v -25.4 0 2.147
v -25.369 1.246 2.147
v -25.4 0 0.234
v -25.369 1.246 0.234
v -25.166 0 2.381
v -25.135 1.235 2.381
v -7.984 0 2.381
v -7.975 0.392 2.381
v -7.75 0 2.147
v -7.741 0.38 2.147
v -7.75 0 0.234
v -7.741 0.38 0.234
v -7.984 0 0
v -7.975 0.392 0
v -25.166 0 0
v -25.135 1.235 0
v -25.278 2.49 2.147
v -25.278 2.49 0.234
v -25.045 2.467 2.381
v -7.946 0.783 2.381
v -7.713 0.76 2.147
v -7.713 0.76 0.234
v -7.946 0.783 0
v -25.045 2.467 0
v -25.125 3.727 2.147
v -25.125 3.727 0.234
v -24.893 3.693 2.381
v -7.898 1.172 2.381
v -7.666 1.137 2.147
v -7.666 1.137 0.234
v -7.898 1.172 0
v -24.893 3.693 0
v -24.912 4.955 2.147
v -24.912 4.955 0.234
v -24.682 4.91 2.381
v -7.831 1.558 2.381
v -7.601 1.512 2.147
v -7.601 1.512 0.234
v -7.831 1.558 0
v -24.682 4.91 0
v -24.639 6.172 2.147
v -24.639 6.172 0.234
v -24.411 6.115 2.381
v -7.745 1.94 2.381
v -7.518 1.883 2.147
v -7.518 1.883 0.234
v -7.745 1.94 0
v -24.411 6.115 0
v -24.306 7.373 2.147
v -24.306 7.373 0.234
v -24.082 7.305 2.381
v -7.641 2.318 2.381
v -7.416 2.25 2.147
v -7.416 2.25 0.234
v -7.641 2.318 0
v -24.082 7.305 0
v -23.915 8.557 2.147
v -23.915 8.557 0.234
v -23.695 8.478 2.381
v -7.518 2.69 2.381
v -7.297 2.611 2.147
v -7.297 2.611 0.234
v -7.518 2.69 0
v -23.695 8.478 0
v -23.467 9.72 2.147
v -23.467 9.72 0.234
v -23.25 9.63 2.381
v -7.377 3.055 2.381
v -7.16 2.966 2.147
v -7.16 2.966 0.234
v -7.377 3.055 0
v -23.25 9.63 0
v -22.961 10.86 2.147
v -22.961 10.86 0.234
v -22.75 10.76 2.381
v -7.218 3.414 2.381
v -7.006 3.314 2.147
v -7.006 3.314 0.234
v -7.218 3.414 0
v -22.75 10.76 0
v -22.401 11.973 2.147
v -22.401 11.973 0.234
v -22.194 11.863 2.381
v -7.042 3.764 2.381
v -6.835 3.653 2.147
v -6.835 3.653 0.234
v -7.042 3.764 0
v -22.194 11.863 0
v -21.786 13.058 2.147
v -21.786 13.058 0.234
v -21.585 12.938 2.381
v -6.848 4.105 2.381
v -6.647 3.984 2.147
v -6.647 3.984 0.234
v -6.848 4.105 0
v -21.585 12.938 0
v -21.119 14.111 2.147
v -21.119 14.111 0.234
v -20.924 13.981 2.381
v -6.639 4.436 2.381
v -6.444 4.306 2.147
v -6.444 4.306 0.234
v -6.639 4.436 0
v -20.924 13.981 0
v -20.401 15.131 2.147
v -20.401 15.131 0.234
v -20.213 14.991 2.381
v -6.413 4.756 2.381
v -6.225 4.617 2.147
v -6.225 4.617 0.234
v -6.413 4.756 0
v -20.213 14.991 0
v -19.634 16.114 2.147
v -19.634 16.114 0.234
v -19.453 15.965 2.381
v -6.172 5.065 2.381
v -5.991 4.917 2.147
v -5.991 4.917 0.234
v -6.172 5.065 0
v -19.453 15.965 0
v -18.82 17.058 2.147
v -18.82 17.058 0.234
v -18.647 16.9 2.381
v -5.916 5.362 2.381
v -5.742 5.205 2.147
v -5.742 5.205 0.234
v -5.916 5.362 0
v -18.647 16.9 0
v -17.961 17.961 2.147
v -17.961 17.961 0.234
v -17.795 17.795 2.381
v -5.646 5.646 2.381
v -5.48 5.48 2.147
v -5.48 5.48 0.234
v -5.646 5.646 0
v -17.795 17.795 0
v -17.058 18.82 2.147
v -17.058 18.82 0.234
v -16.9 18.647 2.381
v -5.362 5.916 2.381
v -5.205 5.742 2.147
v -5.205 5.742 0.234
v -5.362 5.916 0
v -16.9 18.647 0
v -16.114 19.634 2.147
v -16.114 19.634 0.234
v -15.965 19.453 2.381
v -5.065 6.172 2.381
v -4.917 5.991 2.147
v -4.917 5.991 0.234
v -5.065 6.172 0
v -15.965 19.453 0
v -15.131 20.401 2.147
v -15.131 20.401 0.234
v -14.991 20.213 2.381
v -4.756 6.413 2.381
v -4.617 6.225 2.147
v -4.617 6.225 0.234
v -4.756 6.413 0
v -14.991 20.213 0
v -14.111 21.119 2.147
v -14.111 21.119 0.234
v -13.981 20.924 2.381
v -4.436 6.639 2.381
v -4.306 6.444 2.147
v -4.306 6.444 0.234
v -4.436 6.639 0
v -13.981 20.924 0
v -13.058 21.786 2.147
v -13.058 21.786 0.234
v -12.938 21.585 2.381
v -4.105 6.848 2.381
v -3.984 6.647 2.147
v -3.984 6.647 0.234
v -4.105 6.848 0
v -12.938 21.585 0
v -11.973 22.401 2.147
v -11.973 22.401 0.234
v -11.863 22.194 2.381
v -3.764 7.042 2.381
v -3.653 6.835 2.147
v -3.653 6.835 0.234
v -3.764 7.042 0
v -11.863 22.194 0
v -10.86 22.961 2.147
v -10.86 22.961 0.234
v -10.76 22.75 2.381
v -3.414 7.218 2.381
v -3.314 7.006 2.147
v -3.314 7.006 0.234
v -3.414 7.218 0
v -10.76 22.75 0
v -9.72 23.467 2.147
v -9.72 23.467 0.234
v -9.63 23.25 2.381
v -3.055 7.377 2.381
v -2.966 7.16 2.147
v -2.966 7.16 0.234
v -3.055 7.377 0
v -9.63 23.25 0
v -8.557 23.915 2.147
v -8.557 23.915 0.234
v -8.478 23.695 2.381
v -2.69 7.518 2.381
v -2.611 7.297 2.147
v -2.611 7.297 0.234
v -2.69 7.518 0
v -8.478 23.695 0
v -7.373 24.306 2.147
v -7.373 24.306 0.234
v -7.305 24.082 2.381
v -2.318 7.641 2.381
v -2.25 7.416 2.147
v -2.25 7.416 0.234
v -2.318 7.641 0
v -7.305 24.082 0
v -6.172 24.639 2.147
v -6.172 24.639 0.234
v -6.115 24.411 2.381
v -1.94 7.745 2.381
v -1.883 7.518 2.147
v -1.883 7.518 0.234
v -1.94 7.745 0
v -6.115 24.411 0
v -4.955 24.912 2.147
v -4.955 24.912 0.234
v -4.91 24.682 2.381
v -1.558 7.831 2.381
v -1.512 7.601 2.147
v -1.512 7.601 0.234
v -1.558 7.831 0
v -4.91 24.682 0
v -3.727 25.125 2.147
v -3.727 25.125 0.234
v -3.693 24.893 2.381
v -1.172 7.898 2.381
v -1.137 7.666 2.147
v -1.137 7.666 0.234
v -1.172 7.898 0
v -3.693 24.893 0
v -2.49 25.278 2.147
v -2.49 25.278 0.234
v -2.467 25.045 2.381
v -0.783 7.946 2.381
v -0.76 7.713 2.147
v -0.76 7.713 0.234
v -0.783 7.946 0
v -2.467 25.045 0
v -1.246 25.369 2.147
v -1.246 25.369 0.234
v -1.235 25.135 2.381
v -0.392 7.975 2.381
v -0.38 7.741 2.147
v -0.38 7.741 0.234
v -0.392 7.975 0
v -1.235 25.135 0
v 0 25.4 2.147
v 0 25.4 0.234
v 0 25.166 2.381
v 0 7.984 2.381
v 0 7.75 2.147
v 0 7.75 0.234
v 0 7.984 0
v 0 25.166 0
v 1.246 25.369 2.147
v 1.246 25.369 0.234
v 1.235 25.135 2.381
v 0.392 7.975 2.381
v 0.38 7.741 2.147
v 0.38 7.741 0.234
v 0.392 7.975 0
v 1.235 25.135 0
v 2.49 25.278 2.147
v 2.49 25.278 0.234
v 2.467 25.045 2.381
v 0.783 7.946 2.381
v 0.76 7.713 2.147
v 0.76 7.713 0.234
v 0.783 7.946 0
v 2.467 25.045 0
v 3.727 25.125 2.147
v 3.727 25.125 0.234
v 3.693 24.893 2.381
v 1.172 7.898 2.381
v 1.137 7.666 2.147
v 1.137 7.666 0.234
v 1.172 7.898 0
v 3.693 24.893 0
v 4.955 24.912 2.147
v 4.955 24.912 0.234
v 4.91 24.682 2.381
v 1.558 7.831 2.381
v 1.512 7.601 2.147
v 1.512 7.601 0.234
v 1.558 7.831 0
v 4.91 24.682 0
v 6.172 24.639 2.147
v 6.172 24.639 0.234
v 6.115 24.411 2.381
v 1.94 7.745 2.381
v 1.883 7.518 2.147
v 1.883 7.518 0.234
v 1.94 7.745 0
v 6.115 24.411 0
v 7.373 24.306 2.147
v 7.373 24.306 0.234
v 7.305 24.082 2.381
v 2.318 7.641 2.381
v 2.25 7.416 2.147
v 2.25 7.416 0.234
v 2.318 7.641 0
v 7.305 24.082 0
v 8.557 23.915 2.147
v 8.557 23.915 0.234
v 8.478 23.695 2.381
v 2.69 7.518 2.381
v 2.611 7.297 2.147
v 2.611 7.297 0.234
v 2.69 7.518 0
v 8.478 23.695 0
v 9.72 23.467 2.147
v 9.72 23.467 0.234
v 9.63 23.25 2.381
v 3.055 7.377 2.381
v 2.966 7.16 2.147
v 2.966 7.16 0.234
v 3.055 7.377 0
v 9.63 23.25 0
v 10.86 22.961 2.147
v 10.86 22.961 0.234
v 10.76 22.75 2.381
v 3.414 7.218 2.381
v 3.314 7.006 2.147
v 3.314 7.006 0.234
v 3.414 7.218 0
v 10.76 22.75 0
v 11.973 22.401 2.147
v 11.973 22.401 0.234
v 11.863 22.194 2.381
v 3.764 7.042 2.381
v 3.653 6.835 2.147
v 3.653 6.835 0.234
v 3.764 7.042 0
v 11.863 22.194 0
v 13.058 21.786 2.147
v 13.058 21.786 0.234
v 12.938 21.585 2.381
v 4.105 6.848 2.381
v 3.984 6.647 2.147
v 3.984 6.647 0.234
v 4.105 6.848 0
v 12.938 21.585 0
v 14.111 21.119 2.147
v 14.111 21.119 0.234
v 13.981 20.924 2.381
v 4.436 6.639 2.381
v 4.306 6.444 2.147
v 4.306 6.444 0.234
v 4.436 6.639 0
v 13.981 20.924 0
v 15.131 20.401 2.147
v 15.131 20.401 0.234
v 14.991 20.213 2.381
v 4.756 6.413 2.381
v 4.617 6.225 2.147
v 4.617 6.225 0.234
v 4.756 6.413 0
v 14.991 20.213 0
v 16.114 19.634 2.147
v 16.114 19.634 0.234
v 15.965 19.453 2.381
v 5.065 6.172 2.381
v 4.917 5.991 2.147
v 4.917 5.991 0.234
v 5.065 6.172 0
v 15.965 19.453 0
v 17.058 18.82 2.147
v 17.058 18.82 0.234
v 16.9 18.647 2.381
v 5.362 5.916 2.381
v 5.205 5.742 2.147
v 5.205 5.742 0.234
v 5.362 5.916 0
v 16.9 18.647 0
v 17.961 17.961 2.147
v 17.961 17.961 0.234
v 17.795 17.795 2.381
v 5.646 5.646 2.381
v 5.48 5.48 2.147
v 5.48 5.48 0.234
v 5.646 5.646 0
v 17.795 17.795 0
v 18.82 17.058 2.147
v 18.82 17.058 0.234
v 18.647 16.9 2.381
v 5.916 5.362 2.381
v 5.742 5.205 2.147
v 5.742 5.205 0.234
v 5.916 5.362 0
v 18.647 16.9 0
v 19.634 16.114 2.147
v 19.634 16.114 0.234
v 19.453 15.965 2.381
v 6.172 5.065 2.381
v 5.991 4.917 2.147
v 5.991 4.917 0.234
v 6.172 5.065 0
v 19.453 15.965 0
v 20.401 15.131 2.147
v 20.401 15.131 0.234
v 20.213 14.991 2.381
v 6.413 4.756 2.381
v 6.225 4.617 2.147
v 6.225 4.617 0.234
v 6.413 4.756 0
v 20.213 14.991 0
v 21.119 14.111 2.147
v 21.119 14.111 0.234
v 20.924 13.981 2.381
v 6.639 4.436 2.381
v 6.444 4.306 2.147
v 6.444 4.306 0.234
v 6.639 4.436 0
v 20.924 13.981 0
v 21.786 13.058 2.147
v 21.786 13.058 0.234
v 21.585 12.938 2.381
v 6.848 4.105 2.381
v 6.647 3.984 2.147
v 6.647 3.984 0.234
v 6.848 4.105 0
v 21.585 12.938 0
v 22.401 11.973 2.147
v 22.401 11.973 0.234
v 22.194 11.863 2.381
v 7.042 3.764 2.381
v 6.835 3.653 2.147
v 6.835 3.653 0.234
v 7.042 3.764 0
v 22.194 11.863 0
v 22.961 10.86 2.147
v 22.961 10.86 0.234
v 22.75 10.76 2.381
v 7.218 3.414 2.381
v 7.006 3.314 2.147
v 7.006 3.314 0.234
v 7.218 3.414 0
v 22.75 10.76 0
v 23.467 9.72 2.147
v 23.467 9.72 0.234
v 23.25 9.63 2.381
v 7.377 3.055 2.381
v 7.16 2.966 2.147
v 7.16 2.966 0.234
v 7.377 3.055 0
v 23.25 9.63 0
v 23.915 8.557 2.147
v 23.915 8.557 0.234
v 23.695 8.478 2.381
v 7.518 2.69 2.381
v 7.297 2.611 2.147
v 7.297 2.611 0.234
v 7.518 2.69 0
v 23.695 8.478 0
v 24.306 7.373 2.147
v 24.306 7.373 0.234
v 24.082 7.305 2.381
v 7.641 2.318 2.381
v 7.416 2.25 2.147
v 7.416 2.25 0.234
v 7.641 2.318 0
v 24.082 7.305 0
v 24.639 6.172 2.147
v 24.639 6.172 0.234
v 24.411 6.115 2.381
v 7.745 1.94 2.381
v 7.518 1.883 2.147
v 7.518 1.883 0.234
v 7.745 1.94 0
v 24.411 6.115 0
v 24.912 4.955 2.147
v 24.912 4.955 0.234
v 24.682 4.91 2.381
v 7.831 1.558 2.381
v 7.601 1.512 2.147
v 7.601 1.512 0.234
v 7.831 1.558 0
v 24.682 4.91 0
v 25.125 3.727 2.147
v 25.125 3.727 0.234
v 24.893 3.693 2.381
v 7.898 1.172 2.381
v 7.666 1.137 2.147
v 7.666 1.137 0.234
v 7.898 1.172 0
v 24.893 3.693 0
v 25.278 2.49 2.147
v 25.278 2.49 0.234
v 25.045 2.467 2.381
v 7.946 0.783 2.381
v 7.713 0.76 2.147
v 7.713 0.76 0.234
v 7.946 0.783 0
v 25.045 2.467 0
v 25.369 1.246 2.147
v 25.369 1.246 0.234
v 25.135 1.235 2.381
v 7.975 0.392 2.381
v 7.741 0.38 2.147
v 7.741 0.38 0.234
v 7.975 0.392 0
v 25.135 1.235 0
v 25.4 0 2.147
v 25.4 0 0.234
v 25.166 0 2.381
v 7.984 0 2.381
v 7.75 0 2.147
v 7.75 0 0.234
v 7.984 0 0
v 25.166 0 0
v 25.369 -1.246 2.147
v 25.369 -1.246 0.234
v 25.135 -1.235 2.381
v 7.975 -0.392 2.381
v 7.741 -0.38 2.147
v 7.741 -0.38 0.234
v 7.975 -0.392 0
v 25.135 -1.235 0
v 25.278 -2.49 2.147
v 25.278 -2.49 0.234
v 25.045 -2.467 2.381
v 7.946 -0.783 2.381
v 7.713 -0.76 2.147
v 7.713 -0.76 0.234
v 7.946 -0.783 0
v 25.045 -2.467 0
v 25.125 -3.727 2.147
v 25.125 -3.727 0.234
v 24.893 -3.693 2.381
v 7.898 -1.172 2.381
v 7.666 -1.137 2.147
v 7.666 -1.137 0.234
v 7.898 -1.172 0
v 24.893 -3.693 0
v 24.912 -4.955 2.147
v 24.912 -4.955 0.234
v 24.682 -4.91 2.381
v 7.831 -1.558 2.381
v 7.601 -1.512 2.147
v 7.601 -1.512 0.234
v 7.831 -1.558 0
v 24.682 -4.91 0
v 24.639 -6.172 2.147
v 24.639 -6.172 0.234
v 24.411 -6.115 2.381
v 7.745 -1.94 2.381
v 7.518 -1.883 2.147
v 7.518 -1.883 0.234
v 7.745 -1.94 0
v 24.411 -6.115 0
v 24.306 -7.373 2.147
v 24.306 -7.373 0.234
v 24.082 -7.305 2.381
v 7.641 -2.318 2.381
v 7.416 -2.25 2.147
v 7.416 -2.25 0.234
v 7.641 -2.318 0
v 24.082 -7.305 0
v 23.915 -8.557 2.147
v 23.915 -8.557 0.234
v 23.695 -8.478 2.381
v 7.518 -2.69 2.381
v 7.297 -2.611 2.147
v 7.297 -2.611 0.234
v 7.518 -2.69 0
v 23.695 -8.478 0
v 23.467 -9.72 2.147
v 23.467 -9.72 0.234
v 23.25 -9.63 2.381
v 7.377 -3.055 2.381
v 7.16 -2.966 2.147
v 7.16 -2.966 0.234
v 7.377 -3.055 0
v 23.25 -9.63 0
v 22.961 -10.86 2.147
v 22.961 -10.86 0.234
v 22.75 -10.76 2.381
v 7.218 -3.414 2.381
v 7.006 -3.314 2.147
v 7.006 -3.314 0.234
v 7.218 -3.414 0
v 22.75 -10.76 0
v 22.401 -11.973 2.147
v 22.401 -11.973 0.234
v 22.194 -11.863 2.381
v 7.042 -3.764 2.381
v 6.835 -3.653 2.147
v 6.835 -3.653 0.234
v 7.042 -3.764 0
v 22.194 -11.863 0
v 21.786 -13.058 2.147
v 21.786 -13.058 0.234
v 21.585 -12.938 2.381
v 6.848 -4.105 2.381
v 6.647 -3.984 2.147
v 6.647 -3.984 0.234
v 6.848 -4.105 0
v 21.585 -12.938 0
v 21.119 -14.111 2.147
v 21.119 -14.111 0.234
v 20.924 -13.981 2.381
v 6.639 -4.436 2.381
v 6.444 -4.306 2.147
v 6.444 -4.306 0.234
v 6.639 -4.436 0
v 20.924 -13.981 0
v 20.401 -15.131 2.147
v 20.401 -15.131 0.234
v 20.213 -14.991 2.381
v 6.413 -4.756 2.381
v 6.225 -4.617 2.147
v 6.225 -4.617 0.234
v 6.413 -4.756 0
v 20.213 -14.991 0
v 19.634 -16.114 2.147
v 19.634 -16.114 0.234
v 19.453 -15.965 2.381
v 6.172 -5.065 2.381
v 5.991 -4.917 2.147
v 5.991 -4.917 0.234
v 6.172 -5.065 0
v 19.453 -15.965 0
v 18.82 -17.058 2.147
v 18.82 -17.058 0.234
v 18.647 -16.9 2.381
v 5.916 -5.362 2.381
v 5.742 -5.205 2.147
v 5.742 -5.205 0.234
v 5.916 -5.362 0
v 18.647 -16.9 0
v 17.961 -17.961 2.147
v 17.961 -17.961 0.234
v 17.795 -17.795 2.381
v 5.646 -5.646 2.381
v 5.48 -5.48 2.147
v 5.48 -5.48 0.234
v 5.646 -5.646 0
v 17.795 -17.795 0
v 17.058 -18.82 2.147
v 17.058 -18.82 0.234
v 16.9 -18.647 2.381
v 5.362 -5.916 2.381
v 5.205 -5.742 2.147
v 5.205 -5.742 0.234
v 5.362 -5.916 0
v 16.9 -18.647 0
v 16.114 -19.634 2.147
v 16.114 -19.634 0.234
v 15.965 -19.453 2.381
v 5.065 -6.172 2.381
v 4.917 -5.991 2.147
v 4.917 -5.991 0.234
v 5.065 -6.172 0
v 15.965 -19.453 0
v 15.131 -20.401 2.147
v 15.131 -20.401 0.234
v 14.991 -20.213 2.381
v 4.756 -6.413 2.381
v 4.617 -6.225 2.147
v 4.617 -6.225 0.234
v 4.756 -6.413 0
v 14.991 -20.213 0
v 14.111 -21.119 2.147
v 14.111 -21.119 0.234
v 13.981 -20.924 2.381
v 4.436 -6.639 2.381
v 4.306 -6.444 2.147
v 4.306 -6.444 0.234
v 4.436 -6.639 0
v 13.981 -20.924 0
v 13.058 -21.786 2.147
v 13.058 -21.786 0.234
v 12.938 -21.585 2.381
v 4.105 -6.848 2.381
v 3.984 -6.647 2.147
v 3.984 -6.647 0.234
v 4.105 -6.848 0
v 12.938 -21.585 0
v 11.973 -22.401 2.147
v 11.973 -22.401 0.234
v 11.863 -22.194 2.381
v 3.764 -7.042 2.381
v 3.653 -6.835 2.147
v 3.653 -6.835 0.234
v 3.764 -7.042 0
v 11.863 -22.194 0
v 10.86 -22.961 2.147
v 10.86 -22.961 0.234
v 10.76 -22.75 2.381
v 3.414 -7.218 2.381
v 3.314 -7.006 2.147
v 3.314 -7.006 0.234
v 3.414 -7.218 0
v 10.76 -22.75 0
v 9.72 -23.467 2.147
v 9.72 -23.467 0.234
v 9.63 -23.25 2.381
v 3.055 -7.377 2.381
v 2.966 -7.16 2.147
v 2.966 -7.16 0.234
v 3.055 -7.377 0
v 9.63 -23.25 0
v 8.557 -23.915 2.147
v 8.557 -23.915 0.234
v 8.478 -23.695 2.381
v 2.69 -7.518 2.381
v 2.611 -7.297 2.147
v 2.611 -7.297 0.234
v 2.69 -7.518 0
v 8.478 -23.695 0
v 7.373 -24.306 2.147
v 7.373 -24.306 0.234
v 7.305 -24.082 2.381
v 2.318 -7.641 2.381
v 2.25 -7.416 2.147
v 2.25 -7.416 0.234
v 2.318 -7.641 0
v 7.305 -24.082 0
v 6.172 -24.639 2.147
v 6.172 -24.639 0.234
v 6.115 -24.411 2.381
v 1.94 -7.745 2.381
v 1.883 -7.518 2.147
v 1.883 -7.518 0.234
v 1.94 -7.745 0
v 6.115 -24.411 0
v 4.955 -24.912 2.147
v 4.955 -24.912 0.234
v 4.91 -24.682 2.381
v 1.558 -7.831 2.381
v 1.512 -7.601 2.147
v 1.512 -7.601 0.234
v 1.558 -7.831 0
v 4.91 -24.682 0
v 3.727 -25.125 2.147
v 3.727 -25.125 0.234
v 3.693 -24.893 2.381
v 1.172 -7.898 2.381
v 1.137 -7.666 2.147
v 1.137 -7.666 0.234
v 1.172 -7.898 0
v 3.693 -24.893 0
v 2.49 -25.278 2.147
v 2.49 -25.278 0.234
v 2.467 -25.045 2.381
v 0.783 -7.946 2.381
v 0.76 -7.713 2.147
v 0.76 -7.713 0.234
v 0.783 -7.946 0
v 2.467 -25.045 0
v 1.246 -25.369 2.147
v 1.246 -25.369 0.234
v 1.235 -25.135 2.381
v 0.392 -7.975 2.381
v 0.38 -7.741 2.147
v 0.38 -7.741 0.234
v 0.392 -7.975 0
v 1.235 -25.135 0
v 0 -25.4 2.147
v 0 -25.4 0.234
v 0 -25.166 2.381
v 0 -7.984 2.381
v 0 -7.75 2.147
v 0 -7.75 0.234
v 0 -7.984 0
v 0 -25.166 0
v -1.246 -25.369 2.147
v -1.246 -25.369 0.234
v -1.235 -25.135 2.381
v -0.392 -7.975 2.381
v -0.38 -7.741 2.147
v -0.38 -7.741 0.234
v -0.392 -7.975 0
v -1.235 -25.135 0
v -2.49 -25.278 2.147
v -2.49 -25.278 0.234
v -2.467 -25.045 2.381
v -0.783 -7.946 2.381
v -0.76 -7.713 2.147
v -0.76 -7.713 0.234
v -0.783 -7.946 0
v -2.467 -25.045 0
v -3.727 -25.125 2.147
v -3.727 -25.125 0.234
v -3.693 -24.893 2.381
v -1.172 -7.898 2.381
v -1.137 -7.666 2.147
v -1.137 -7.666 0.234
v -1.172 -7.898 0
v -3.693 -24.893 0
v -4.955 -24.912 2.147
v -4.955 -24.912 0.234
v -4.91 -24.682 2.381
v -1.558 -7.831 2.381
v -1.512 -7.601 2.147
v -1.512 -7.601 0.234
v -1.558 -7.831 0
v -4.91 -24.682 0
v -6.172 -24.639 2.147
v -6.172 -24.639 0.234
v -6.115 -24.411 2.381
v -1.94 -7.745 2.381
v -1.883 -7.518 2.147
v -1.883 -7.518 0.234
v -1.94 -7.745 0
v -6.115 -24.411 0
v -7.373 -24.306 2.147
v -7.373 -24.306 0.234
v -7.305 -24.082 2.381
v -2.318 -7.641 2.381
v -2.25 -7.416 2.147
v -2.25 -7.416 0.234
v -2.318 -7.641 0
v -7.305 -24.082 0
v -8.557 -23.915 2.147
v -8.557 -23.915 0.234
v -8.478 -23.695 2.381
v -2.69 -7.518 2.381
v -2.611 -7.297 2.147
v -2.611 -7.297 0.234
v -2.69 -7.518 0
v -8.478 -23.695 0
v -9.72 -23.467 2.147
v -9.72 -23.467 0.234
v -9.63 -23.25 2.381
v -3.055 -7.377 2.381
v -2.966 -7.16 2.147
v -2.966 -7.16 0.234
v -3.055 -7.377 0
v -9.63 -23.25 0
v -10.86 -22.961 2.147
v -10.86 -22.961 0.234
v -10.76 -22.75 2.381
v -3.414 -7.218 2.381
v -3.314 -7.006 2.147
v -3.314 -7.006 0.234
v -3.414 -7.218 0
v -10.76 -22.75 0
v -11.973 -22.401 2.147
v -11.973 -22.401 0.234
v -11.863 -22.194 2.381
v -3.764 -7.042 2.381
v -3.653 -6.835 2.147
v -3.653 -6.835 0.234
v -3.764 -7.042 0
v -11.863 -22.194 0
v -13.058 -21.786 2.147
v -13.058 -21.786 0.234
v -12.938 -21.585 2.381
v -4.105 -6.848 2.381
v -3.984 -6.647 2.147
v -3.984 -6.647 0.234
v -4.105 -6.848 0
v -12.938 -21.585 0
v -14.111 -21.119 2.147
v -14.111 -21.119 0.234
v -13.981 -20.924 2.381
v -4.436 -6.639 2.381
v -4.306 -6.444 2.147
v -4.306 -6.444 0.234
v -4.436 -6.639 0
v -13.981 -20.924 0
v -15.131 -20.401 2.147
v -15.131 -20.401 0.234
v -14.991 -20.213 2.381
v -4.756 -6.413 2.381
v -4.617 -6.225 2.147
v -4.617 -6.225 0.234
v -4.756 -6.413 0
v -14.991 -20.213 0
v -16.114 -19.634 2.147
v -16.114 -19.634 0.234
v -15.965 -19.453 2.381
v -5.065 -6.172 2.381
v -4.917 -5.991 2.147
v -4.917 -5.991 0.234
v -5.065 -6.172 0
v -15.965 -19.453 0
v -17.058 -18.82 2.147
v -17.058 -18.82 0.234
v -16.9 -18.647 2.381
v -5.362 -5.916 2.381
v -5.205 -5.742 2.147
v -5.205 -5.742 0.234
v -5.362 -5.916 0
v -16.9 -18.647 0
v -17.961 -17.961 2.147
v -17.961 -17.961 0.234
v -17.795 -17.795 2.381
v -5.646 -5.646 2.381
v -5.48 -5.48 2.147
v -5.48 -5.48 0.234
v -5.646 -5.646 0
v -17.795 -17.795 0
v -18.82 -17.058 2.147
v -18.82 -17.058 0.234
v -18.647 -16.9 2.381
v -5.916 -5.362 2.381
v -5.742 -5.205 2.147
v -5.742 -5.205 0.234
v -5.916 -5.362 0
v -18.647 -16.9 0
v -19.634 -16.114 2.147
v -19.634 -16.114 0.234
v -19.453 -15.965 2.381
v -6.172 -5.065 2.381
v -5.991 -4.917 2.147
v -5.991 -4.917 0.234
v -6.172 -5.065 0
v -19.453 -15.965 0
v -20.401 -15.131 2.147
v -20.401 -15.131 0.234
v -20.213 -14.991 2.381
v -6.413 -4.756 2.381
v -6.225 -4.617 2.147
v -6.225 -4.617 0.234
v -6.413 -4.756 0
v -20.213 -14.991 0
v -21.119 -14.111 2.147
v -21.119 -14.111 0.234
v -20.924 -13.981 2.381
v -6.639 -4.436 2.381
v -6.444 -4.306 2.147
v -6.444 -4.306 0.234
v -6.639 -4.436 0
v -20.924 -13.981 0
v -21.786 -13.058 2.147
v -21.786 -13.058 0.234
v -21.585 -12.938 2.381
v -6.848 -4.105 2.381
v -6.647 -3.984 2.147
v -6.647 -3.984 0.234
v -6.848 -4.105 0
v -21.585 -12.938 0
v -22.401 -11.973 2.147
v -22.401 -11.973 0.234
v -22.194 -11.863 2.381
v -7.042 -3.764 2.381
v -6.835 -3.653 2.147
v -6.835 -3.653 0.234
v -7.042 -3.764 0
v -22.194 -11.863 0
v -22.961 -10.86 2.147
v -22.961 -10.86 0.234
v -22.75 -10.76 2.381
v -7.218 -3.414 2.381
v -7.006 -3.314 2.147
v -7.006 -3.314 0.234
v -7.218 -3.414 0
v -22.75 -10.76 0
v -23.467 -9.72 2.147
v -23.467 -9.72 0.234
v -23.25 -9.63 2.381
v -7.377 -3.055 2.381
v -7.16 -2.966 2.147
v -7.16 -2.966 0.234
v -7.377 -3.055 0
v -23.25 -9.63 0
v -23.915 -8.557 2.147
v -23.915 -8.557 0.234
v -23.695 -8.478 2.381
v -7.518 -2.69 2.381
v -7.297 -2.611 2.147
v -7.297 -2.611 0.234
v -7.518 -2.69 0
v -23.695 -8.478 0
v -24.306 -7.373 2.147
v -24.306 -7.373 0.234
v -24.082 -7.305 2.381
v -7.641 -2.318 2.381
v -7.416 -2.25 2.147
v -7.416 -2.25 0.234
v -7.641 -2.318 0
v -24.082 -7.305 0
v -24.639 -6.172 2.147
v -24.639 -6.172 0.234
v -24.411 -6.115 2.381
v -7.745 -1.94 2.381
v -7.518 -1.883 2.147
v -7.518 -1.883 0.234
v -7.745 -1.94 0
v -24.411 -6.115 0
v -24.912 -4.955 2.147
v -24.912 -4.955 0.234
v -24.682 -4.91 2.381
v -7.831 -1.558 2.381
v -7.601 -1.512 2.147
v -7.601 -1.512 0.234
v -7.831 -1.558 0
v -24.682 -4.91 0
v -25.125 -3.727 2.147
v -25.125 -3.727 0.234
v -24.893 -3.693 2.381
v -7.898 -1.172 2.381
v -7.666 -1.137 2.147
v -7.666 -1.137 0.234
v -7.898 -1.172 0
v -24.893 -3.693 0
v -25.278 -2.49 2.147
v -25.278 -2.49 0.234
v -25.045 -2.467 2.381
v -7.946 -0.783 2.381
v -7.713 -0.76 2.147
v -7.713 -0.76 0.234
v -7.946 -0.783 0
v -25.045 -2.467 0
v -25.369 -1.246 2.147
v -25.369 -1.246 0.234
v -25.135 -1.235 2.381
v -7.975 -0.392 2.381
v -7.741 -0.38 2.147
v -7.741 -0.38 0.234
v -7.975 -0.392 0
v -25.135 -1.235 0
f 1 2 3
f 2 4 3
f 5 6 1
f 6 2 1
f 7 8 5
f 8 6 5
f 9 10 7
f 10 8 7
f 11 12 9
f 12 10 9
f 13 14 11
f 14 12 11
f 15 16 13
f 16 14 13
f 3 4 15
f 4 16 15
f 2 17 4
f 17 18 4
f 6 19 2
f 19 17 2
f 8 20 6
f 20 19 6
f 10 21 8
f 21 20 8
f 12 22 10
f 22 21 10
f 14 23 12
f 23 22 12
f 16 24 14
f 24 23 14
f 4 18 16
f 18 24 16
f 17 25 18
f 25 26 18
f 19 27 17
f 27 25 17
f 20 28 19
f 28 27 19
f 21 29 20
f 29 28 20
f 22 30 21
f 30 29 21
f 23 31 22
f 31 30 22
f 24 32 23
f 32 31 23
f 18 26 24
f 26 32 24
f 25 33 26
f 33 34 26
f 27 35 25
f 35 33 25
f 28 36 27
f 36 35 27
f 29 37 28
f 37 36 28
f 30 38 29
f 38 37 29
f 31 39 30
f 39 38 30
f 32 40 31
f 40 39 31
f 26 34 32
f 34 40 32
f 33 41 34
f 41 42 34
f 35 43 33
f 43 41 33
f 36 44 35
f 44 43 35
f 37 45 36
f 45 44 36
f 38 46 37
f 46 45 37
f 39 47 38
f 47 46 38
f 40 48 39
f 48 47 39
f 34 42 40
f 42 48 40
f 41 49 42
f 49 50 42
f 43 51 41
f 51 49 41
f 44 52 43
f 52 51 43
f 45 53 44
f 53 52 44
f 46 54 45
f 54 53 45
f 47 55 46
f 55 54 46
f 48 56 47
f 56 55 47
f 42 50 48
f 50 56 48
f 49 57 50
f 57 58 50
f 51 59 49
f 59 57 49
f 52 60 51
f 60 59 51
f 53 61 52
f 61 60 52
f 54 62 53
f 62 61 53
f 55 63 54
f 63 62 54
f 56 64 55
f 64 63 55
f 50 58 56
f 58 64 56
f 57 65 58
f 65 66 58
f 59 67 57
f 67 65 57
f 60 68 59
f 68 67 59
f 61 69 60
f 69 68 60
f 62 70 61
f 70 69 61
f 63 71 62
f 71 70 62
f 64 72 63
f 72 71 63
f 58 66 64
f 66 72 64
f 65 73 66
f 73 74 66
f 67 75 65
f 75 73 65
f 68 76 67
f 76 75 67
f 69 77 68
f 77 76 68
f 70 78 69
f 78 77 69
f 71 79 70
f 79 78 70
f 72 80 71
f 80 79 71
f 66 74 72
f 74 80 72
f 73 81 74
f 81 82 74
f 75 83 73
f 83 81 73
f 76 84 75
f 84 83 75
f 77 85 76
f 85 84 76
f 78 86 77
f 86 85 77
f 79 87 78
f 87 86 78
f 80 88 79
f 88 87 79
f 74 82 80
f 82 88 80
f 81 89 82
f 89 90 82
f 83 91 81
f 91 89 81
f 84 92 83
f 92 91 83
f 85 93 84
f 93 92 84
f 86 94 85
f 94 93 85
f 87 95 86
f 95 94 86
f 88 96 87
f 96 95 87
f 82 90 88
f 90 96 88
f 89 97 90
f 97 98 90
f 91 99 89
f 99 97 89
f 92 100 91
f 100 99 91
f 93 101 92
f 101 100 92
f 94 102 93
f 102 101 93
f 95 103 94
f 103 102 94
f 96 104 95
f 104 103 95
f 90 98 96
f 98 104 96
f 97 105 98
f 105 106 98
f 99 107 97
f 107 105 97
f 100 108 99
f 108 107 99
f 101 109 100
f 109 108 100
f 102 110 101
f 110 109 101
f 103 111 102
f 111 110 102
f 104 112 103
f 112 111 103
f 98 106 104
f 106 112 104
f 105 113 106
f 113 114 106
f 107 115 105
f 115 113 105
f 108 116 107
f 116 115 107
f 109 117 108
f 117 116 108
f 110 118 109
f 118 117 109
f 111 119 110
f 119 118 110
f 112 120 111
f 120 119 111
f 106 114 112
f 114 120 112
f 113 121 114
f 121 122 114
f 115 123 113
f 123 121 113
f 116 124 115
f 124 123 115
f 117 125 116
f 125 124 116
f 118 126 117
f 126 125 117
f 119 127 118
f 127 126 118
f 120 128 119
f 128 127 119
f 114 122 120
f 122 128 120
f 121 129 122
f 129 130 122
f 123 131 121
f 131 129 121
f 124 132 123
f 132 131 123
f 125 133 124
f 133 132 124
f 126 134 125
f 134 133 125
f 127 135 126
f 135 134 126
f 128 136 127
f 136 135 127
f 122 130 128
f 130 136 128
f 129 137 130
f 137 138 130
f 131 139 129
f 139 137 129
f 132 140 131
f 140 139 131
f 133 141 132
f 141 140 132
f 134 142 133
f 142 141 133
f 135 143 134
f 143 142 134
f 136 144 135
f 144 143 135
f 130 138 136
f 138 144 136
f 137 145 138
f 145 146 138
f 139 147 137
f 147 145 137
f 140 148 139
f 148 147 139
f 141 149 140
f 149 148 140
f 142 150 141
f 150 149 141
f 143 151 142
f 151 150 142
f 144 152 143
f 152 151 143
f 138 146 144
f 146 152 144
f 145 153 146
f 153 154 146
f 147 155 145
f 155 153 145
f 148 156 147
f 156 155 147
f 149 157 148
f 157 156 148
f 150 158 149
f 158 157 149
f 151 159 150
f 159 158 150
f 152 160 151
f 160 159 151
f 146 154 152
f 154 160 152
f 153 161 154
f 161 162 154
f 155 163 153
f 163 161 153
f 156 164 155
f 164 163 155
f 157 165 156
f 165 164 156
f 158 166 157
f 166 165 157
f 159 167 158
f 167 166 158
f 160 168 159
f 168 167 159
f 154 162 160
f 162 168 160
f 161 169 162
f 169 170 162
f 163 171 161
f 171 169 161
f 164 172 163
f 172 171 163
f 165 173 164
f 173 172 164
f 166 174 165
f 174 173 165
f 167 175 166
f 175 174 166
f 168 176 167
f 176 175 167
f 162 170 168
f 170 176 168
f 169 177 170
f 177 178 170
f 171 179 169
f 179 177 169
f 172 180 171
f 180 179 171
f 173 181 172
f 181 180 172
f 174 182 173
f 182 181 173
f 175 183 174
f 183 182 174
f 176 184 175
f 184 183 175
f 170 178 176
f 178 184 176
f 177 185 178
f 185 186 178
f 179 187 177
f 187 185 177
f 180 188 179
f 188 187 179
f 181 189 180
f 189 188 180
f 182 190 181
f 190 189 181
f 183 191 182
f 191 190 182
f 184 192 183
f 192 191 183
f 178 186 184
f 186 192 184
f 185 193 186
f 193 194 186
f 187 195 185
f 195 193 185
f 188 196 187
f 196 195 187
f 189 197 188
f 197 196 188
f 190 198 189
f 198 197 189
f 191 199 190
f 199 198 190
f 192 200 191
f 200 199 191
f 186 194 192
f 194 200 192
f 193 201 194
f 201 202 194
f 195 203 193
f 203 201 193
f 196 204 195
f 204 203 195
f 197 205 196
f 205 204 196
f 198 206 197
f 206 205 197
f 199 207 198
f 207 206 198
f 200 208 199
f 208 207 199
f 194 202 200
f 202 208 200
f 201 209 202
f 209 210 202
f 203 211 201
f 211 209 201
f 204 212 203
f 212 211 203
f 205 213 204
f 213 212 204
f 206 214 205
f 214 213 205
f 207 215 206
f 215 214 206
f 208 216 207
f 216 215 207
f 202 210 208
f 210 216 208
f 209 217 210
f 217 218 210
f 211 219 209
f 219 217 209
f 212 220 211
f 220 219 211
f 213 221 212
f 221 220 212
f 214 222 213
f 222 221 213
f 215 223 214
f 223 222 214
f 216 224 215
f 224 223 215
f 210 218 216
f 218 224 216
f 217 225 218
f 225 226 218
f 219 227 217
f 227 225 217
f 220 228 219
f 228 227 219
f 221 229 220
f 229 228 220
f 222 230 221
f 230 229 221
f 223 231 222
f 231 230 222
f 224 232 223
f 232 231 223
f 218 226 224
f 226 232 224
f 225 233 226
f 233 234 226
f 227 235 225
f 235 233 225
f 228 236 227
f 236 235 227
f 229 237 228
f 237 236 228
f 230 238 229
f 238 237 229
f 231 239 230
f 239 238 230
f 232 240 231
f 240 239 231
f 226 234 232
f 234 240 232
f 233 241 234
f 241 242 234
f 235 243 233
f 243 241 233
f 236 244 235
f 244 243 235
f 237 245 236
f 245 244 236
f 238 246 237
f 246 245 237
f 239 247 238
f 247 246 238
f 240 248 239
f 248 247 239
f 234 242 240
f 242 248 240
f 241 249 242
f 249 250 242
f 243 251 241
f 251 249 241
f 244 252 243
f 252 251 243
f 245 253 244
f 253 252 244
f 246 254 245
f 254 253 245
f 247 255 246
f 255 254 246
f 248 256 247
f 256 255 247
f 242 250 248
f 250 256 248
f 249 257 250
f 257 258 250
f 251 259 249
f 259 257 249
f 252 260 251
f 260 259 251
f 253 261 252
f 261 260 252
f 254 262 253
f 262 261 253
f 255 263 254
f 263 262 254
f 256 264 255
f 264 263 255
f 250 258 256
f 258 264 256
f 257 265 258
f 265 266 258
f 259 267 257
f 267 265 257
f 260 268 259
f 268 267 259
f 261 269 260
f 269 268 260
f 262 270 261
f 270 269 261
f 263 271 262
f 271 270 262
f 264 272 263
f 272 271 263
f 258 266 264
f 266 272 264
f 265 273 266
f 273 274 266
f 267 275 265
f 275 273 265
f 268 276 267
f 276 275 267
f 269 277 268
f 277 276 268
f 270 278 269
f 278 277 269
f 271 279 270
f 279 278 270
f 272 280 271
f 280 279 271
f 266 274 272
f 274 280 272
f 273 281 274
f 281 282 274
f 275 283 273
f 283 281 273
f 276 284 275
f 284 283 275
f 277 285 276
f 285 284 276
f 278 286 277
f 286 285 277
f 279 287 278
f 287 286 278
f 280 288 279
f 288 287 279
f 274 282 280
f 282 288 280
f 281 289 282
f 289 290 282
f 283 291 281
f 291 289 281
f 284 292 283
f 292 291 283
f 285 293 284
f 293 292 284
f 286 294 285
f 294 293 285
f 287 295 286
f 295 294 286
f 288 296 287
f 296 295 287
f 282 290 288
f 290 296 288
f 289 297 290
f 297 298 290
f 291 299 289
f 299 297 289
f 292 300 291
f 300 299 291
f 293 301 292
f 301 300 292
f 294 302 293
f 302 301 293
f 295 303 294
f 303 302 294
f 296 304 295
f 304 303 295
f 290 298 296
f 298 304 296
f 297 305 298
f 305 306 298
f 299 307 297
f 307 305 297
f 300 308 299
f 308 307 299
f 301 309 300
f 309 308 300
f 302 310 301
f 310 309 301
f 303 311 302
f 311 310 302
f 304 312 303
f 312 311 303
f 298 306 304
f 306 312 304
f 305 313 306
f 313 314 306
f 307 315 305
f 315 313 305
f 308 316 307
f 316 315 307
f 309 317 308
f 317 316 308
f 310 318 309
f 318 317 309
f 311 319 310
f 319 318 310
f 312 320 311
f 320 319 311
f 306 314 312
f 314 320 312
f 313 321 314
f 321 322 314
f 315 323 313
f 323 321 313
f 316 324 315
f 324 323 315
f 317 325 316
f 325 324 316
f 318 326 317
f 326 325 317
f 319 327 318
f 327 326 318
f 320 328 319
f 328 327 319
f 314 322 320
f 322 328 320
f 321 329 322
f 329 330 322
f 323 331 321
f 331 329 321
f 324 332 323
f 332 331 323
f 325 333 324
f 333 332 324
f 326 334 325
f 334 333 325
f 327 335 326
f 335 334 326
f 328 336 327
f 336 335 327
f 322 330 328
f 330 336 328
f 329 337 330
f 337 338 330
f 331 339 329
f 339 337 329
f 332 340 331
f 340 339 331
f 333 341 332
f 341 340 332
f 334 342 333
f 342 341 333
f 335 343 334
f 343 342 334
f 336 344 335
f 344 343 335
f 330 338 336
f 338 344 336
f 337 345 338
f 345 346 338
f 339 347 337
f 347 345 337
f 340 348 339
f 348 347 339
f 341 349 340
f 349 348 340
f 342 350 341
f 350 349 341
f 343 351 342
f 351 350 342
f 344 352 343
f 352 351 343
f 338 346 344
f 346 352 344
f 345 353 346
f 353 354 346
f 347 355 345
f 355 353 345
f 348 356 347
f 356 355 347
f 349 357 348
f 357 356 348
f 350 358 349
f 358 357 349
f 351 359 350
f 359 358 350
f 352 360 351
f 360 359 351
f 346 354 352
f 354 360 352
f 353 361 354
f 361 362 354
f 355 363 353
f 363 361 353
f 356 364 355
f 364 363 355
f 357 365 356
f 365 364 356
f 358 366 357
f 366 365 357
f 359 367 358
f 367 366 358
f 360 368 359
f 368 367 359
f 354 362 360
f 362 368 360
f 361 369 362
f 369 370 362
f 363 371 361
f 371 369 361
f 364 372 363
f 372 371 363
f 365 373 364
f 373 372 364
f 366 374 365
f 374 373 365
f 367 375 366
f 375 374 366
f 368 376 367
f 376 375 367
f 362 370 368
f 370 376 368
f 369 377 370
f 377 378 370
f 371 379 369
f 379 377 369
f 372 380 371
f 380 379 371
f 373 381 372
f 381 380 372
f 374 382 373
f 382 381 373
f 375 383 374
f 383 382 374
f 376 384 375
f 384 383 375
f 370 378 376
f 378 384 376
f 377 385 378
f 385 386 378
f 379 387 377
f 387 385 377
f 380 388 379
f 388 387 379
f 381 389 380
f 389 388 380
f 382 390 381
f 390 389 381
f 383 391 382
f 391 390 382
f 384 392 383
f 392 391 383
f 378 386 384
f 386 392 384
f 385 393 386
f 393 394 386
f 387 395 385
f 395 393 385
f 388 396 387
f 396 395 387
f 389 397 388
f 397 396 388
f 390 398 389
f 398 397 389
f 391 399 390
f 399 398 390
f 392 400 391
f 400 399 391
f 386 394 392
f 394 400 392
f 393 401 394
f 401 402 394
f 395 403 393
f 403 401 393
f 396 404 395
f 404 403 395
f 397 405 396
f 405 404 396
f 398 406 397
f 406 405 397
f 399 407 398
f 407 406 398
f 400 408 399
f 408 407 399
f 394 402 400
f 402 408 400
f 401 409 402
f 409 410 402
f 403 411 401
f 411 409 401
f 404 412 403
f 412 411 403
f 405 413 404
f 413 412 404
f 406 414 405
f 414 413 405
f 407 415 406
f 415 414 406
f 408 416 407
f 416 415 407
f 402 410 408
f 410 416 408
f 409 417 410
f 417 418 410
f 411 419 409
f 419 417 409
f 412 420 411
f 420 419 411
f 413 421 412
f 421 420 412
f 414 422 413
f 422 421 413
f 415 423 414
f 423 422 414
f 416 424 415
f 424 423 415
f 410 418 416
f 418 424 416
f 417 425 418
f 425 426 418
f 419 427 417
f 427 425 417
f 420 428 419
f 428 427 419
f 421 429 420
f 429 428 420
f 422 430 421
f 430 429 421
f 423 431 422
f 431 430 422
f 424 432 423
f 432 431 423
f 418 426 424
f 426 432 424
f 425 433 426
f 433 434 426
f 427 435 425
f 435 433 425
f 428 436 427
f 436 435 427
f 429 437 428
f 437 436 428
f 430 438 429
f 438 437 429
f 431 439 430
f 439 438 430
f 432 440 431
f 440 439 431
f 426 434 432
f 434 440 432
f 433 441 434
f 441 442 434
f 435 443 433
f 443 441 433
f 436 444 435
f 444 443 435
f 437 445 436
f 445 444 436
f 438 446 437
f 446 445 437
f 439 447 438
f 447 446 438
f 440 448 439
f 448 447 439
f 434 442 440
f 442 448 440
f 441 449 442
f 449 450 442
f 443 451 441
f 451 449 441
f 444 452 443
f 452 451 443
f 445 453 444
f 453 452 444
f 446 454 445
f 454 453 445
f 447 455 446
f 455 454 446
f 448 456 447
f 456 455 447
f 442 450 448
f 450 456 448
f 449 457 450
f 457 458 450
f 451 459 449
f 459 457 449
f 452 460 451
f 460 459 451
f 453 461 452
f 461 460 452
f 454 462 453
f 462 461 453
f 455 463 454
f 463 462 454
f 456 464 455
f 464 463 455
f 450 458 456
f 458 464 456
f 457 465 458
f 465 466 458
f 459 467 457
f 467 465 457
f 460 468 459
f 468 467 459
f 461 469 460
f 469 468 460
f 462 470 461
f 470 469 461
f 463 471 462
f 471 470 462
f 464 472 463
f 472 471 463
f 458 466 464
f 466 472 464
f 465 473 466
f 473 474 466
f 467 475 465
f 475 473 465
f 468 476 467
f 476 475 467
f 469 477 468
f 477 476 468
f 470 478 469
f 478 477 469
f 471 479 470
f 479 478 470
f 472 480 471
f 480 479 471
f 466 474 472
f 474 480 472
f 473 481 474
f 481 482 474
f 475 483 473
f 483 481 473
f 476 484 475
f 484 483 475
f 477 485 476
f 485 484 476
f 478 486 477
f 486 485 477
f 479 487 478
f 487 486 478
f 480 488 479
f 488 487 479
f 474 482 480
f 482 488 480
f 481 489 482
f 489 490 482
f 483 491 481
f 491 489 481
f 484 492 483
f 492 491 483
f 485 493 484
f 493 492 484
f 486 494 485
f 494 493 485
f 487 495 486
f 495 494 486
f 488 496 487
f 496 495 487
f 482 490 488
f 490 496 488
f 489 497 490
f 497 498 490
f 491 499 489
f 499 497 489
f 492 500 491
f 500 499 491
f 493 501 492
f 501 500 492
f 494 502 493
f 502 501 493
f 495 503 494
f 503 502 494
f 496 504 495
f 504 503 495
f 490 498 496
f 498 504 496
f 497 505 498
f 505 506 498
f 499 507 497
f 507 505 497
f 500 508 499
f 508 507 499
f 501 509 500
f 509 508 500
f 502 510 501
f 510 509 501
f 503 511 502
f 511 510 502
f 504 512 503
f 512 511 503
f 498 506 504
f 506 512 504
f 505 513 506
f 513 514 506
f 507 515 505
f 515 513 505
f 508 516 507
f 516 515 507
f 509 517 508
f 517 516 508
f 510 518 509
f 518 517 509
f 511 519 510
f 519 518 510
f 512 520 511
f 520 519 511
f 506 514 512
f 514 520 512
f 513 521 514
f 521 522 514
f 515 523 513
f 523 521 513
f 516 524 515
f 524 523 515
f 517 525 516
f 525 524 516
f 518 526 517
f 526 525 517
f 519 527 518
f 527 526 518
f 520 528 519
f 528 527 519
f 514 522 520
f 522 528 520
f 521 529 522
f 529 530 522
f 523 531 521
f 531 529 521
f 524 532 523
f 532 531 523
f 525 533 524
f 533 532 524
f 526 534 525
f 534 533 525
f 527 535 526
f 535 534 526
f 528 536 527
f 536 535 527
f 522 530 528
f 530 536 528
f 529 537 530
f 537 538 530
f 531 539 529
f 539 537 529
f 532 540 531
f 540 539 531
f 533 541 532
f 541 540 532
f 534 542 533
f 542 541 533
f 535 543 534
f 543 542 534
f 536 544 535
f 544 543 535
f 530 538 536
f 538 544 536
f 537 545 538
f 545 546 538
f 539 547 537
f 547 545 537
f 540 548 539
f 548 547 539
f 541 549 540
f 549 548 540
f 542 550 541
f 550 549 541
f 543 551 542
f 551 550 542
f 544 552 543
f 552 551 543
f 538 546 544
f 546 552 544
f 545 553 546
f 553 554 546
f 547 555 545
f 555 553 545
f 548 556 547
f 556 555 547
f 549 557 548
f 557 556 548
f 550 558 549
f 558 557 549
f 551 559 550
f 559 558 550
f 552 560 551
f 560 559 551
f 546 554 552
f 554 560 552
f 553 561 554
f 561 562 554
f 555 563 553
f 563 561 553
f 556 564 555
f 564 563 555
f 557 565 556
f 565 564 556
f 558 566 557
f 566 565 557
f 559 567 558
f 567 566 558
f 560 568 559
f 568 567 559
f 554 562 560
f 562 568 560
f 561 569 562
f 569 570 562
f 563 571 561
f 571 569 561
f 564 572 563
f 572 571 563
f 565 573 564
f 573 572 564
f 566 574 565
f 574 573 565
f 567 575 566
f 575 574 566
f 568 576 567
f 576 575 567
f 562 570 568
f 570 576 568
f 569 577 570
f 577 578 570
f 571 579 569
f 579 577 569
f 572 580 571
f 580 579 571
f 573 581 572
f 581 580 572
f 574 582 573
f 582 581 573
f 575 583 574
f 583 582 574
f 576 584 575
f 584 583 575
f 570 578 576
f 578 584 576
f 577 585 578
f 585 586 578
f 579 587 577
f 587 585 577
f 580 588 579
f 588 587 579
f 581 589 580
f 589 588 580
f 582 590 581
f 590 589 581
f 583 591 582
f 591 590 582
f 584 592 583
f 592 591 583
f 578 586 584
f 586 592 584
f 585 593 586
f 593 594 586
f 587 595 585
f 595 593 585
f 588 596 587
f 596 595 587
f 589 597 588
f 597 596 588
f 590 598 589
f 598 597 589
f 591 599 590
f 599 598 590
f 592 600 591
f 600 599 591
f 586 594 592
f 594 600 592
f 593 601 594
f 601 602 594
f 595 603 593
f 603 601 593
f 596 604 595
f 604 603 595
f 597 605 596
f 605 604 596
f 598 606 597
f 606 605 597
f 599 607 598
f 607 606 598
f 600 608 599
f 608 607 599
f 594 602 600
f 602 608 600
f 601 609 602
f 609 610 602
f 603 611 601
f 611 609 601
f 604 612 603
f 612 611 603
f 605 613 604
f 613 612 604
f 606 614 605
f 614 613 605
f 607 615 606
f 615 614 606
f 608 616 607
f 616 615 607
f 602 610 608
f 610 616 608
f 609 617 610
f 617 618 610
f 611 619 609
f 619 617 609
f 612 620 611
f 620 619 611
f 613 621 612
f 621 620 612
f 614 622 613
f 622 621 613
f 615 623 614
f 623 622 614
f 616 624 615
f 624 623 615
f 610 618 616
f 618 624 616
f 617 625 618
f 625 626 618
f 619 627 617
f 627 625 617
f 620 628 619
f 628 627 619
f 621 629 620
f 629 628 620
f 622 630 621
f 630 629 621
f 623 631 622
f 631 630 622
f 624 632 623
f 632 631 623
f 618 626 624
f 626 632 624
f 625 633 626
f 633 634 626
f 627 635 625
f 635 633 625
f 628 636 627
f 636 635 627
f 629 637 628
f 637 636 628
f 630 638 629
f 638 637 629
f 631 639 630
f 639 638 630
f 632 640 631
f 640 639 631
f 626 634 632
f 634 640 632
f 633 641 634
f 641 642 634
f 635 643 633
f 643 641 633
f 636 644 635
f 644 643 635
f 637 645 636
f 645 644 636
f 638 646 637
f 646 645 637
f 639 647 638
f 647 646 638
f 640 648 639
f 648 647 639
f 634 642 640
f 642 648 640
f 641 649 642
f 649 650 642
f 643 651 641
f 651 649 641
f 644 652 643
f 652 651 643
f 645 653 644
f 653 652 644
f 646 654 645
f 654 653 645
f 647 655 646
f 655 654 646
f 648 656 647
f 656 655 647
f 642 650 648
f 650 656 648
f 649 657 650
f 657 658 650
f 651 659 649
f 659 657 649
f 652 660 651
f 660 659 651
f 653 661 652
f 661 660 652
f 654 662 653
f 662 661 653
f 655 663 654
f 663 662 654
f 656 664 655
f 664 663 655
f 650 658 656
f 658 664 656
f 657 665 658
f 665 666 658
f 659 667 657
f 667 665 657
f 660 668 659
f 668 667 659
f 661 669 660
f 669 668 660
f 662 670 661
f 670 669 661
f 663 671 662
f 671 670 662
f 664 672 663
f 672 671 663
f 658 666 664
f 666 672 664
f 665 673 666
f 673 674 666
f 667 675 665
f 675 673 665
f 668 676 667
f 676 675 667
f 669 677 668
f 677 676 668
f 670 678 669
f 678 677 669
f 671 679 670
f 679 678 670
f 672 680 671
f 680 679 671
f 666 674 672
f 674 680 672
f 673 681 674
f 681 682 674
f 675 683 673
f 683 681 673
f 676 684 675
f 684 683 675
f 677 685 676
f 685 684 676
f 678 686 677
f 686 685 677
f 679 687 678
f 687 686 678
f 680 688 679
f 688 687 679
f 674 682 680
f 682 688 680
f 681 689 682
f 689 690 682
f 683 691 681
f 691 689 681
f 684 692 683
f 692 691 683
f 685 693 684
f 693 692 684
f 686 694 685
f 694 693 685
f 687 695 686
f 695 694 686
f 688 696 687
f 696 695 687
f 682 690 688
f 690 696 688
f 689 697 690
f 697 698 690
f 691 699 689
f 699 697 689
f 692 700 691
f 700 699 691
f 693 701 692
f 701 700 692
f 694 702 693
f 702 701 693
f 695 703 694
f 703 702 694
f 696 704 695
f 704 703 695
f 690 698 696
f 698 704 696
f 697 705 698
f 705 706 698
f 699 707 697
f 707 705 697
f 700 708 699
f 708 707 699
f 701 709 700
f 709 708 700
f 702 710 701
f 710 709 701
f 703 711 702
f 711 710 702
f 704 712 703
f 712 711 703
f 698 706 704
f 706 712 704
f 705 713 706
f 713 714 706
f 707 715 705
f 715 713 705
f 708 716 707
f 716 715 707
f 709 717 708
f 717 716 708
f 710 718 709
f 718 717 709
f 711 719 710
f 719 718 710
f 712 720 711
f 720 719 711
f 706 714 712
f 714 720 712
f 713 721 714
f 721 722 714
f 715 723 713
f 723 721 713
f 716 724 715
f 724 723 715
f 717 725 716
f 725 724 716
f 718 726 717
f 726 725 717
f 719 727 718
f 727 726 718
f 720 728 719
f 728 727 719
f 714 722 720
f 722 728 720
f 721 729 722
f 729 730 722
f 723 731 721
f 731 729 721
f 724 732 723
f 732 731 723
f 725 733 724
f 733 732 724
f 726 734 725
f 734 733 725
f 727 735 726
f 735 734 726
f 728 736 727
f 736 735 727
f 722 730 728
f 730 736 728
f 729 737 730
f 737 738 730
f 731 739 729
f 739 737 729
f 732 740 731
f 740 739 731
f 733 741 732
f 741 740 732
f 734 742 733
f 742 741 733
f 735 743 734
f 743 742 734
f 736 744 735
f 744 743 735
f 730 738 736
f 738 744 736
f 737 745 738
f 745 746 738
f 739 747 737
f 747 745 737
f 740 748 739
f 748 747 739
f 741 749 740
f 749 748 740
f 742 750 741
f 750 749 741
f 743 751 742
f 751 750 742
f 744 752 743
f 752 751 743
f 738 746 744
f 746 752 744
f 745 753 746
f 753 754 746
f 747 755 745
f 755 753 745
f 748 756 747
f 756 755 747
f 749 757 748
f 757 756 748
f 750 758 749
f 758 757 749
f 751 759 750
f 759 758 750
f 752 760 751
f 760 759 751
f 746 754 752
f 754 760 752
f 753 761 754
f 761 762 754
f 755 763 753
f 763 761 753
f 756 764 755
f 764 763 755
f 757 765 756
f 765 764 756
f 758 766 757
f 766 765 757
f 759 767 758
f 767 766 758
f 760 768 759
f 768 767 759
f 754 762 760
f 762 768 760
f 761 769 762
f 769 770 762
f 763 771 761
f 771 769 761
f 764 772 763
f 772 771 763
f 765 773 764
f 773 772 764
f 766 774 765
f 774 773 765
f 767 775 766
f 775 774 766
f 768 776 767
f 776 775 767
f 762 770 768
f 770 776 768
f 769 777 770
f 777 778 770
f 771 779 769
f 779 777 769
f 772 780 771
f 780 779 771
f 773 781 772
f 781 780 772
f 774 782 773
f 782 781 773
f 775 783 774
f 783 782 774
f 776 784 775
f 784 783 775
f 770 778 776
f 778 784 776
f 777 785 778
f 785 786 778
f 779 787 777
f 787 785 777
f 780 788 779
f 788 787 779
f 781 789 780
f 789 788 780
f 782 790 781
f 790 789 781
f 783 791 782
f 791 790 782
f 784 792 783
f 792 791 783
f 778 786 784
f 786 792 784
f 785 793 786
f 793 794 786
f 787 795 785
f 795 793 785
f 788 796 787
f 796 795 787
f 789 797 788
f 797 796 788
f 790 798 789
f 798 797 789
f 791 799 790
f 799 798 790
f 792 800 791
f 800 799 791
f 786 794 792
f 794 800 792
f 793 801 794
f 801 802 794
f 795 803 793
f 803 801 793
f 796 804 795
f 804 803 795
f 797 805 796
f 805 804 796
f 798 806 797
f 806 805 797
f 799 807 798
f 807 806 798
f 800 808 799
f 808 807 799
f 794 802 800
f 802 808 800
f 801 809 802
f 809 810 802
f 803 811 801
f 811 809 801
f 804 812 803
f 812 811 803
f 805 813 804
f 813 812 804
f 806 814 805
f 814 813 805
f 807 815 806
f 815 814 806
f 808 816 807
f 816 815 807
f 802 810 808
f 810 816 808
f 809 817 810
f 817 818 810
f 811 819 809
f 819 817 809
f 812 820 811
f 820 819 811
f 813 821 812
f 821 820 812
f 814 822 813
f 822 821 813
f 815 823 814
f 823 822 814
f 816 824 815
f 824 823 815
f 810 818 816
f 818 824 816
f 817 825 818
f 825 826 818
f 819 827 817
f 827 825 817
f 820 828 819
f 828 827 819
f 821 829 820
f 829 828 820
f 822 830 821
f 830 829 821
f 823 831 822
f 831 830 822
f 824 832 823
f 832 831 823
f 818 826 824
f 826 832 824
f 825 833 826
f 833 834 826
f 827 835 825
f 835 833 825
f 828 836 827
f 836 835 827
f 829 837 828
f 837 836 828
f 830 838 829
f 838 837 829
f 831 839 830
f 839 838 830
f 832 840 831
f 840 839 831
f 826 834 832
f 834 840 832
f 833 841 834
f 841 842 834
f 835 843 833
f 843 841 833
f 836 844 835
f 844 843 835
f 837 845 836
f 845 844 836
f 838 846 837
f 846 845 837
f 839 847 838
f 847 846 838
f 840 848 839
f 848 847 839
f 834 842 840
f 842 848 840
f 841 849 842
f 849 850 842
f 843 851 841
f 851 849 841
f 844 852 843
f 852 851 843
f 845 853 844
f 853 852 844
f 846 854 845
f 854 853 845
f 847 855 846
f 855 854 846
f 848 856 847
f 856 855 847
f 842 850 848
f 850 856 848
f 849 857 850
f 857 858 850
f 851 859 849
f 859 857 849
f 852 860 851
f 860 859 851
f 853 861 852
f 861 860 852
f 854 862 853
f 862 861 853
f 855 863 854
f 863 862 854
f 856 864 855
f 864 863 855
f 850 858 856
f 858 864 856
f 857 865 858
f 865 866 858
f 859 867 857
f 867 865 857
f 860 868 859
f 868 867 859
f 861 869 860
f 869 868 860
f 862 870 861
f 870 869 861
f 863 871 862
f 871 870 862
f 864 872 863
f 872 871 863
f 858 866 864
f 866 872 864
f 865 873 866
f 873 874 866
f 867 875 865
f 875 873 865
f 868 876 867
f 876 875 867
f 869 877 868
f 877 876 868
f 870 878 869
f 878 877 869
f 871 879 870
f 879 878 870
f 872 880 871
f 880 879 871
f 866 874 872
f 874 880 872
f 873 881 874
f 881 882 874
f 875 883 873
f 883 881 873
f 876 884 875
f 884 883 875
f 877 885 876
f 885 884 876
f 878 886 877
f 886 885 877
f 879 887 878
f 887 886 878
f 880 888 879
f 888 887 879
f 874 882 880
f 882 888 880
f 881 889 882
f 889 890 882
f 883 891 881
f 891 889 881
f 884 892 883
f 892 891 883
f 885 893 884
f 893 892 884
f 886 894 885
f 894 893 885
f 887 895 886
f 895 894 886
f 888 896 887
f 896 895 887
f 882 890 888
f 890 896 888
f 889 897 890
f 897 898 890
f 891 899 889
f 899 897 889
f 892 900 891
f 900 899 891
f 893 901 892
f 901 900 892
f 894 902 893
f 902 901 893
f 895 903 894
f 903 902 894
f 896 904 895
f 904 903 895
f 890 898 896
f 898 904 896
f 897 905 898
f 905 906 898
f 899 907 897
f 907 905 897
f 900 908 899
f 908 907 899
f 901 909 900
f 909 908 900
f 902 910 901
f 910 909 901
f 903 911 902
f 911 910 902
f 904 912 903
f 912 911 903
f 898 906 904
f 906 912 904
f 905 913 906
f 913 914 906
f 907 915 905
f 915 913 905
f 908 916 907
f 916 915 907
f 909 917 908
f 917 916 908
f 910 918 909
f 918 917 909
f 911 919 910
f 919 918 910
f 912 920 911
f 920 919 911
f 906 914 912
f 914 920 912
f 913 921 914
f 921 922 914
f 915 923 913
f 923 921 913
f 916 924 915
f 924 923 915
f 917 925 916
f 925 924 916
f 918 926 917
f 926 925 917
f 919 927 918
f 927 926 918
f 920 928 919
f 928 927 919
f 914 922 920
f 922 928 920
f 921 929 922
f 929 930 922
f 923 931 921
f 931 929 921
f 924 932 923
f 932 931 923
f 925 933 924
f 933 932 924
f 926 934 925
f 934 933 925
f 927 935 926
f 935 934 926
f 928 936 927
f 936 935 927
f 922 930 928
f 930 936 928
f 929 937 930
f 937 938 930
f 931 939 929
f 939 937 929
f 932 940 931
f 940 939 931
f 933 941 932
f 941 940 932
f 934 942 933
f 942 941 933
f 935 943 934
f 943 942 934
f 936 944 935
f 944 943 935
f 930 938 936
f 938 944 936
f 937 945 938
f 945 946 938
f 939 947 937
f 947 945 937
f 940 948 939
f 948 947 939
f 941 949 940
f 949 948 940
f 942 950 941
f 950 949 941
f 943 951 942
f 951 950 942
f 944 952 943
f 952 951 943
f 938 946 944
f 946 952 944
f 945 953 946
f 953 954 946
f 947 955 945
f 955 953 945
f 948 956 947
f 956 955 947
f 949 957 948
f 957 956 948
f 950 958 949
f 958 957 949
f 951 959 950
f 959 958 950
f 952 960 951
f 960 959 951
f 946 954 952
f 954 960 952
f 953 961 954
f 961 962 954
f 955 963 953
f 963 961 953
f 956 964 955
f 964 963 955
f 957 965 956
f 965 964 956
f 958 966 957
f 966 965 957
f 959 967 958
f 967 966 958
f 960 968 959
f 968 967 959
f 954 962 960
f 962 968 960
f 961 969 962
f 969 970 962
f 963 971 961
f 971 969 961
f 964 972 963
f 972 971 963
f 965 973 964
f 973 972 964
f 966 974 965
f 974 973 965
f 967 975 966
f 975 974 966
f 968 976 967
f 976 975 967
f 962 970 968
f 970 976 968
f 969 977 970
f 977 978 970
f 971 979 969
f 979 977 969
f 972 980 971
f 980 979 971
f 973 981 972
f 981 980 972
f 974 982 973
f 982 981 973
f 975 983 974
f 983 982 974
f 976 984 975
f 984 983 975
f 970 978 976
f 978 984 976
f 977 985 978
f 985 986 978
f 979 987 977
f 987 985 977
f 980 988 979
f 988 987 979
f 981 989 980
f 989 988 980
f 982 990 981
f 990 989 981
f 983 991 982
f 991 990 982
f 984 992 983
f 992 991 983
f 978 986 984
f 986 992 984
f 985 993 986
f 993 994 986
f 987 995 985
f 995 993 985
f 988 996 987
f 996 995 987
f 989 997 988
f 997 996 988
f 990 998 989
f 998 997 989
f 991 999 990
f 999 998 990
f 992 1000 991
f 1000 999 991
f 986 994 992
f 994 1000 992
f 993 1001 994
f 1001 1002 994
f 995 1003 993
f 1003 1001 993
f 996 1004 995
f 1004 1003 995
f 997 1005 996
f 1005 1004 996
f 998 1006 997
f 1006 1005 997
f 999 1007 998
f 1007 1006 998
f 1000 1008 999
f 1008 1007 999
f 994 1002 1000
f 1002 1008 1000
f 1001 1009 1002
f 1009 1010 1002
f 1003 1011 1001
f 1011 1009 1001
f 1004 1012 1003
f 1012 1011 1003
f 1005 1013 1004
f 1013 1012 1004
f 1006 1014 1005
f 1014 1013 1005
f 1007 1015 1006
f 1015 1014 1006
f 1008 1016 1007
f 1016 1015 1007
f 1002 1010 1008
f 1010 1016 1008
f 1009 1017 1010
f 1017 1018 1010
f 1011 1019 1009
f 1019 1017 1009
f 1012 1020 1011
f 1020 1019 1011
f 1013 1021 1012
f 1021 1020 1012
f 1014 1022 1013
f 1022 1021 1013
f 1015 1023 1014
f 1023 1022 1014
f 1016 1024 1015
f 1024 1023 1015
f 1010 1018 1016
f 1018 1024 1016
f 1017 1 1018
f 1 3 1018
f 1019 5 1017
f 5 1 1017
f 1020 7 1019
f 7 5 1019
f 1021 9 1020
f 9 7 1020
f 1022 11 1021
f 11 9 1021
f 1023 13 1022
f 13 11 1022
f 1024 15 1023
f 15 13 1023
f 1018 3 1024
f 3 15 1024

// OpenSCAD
/**
 * Spacers for a table saw arbor, printed one part at a time. The bottom and top parts are
 * flat discs, the middle part adds a hub over the small bore, and the ring is the hub
 * alone, which centers the large-bore disc on the arbor. All dimensions are in millimeters.
 */

/* [Part] */
// Part to print
Part = "bottom"; // [bottom: Bottom, middle: Middle, top: Top, ring: Ring]

/* [Disc] */
// Disc outside diameter (50.8 for 2")
Outer_Diameter = 50.8;

// Disc thickness (2.38125 for 3/32")
Thickness = 2.38125;

// Bore of the bottom disc
Bottom_Bore_Diameter = 15.5;

// Bore of the other parts
Bore_Diameter = 13;

/* [Hub] */
// Hub outside diameter
Hub_Diameter = 15.5;

// Hub thickness (2.38125 for 3/32")
Hub_Thickness = 2.38125;

/* [Finish] */
// Chamfer on every circular edge (0 to disable)
Edge_Chamfer = 0.4;

/* [Hidden] */
$fn = 128;

assert(Bore_Diameter < Hub_Diameter && Hub_Diameter <= Bottom_Bore_Diameter, "Bore_Diameter must be less than Hub_Diameter, which must not exceed Bottom_Bore_Diameter");
assert(Bottom_Bore_Diameter < Outer_Diameter, "Bottom_Bore_Diameter must be less than Outer_Diameter");
assert(2 * Edge_Chamfer < (Hub_Diameter - Bore_Diameter) / 2, "Edge_Chamfer is too large for the hub wall");

module Section(inner, outer, height, z = 0) {
  translate([inner / 2, z]) square([(outer - inner) / 2, height]);
}

module Profile() {
  if (Part == "bottom") {
    Section(Bottom_Bore_Diameter, Outer_Diameter, Thickness);
  } else if (Part == "top") {
    Section(Bore_Diameter, Outer_Diameter, Thickness);
  } else if (Part == "ring") {
    Section(Bore_Diameter, Hub_Diameter, Hub_Thickness);
  } else {
    Section(Bore_Diameter, Outer_Diameter, Thickness);
    Section(Bore_Diameter, Hub_Diameter, Hub_Thickness + 0.01, Thickness - 0.01);
  }
}

module Chamfered() {
  if (Edge_Chamfer > 0) {
    offset(delta = Edge_Chamfer, chamfer = true) offset(delta = -Edge_Chamfer) children();
  } else {
    children();
  }
}

rotate_extrude() Chamfered() Profile();
